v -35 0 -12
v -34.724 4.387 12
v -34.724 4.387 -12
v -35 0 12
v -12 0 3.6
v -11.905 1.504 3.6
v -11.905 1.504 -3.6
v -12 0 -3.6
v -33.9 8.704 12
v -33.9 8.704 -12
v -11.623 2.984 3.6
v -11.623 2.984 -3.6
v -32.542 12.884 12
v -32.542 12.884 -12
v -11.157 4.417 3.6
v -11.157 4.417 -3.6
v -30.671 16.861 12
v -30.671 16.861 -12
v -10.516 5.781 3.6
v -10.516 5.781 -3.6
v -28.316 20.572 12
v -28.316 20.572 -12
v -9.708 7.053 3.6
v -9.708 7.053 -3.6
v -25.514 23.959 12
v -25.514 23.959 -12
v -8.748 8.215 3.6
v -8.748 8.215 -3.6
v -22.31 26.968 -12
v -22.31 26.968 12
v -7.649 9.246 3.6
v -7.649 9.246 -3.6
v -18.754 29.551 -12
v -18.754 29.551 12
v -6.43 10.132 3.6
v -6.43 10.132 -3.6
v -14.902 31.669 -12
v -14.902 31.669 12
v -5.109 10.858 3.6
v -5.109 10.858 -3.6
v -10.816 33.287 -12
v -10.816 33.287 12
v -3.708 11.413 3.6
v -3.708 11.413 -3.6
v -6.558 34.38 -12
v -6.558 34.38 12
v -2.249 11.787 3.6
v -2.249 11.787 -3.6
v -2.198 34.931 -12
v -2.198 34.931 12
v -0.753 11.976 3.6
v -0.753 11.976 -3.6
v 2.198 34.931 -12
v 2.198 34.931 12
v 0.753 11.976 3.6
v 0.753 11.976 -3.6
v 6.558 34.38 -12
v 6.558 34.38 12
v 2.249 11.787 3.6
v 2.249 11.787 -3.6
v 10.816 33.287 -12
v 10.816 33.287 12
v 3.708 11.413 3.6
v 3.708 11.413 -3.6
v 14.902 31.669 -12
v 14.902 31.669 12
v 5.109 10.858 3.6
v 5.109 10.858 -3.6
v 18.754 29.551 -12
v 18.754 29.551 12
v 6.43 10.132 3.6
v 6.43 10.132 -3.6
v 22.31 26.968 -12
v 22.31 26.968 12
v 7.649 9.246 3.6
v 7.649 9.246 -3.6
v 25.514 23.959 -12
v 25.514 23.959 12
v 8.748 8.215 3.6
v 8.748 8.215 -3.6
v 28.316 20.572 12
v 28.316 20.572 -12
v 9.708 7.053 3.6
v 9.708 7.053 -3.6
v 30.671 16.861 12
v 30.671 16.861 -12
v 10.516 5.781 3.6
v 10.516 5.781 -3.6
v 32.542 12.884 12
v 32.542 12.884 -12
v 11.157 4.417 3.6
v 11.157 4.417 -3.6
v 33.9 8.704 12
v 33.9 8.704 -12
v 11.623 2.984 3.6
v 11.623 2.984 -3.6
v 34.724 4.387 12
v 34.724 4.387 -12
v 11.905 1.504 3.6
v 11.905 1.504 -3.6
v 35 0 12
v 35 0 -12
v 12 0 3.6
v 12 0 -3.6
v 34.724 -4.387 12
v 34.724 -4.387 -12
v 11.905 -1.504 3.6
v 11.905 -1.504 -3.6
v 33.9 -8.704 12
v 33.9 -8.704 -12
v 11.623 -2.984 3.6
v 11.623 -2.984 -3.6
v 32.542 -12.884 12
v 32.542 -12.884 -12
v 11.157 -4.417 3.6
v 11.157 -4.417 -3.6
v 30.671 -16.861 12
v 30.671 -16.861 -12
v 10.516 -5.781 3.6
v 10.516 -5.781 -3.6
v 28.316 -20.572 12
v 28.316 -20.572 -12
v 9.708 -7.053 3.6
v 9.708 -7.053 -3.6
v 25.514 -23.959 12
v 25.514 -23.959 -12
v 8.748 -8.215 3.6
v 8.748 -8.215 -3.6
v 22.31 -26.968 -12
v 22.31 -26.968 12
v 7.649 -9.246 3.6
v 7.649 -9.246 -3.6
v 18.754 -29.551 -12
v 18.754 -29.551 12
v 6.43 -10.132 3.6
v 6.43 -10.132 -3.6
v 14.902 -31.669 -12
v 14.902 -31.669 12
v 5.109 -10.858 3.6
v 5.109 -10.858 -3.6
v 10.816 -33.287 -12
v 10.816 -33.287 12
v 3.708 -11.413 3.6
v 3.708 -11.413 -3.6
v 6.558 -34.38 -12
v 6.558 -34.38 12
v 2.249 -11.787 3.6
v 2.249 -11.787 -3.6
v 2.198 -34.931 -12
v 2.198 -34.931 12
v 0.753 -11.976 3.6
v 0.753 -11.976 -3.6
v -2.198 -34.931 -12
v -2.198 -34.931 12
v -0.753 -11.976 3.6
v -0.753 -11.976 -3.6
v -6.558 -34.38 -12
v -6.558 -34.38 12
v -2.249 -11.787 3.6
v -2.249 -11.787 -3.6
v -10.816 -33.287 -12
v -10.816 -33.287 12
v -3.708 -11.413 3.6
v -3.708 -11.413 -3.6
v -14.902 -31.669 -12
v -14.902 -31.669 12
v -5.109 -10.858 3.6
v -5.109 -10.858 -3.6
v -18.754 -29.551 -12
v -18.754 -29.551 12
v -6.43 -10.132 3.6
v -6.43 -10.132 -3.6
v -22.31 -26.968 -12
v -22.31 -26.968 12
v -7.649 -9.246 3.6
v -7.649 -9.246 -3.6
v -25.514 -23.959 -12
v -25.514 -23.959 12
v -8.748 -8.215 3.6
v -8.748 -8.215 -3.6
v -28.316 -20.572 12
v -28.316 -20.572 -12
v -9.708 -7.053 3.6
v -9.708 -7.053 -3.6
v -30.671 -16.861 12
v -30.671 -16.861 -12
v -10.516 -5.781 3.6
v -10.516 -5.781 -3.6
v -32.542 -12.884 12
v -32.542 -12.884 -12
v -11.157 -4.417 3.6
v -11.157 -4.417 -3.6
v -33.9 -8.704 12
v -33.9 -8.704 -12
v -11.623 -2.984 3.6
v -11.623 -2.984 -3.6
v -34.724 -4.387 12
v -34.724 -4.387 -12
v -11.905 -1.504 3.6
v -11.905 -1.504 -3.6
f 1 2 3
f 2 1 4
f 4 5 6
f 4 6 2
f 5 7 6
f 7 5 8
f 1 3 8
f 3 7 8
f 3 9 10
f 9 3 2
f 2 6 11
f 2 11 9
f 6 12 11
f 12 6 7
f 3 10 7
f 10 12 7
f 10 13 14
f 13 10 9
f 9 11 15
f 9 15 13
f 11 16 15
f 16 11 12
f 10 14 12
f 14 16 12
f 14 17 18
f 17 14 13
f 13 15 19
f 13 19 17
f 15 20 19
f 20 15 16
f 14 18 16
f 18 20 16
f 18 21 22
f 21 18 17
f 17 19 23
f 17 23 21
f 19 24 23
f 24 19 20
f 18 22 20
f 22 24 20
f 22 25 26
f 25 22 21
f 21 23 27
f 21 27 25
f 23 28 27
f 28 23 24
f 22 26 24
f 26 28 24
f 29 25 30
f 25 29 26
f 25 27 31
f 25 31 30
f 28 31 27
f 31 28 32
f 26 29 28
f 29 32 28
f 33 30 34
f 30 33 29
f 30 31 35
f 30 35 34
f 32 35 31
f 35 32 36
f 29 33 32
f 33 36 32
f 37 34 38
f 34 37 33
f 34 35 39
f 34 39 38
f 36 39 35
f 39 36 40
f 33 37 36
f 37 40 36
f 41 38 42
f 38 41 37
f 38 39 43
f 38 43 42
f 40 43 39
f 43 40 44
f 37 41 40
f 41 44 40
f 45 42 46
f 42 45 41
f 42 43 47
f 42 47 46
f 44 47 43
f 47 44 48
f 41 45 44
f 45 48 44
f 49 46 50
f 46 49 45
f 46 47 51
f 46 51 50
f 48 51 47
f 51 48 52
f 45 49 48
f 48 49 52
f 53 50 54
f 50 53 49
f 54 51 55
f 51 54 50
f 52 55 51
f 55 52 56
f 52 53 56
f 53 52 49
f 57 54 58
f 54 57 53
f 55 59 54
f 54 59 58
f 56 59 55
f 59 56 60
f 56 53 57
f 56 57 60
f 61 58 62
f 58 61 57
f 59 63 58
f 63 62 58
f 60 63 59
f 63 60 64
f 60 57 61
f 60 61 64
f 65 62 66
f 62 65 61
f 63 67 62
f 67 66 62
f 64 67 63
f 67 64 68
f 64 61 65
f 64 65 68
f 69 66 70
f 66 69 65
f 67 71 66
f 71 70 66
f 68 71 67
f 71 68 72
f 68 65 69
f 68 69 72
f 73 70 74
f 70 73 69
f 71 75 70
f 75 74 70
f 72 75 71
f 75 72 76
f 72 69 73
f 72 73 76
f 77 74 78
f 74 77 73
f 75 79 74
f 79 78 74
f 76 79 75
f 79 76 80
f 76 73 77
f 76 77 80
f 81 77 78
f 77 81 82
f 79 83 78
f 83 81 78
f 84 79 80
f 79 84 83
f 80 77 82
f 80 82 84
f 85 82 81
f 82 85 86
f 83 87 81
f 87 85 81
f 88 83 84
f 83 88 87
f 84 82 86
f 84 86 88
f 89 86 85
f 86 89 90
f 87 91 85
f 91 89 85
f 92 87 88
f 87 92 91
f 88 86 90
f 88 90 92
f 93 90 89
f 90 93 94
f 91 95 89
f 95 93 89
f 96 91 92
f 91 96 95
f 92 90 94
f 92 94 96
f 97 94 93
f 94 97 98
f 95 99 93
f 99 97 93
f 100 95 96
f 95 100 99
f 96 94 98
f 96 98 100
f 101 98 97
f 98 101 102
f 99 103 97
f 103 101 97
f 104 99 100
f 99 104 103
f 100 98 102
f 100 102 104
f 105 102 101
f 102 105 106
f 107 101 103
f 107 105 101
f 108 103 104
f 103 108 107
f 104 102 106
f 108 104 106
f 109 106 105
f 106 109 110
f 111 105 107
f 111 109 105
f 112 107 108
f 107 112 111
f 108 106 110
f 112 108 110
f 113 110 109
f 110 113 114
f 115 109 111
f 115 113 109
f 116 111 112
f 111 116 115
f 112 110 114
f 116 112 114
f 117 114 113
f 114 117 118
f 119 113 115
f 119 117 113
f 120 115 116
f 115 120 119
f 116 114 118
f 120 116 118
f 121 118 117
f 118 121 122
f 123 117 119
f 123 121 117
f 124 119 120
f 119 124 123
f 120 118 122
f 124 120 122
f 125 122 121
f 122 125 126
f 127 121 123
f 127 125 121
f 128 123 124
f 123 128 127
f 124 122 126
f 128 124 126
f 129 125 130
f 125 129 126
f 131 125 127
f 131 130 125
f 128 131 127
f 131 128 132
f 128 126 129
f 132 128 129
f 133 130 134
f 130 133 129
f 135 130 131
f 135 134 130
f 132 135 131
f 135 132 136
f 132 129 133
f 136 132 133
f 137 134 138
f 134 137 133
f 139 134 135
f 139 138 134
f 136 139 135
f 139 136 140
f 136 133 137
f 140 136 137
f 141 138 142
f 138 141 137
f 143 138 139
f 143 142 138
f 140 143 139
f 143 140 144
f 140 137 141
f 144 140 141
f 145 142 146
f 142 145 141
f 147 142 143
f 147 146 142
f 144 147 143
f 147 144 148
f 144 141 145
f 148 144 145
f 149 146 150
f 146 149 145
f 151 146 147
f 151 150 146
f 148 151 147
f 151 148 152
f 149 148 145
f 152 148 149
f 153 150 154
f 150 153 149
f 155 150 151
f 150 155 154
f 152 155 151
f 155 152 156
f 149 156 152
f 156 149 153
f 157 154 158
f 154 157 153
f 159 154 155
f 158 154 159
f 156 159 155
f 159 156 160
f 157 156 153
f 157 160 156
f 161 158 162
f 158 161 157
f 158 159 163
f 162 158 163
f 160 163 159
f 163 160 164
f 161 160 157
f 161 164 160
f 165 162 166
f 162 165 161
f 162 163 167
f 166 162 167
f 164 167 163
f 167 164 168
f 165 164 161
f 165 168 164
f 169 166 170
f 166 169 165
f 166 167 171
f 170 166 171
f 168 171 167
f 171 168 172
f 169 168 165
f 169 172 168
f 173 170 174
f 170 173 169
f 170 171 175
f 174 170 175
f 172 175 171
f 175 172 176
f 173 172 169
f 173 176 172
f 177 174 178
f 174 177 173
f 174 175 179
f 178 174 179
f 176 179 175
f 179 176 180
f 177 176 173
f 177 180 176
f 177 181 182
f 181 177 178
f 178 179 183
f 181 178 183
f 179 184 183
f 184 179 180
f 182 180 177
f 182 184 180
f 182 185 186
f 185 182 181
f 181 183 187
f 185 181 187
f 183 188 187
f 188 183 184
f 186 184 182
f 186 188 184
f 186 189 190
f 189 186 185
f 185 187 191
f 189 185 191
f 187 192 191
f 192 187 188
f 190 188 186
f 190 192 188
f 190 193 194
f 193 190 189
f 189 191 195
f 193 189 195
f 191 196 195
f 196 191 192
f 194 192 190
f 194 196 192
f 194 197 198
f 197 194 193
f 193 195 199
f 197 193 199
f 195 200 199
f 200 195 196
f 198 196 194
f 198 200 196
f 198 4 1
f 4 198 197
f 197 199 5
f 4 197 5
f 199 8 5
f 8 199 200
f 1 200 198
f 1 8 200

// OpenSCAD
$fn = 50;

difference() {
	union() {
		rotate_extrude(angle = 360) {
			translate(v = [12, 0, 0]) {
				rotate(a = [0, 0, -90]) {
					polygon(points = [[3.6, 0], [12, 23], [-12, 23], [-3.6, 0]]);
				}
			}
		}
	}
	union();
}
